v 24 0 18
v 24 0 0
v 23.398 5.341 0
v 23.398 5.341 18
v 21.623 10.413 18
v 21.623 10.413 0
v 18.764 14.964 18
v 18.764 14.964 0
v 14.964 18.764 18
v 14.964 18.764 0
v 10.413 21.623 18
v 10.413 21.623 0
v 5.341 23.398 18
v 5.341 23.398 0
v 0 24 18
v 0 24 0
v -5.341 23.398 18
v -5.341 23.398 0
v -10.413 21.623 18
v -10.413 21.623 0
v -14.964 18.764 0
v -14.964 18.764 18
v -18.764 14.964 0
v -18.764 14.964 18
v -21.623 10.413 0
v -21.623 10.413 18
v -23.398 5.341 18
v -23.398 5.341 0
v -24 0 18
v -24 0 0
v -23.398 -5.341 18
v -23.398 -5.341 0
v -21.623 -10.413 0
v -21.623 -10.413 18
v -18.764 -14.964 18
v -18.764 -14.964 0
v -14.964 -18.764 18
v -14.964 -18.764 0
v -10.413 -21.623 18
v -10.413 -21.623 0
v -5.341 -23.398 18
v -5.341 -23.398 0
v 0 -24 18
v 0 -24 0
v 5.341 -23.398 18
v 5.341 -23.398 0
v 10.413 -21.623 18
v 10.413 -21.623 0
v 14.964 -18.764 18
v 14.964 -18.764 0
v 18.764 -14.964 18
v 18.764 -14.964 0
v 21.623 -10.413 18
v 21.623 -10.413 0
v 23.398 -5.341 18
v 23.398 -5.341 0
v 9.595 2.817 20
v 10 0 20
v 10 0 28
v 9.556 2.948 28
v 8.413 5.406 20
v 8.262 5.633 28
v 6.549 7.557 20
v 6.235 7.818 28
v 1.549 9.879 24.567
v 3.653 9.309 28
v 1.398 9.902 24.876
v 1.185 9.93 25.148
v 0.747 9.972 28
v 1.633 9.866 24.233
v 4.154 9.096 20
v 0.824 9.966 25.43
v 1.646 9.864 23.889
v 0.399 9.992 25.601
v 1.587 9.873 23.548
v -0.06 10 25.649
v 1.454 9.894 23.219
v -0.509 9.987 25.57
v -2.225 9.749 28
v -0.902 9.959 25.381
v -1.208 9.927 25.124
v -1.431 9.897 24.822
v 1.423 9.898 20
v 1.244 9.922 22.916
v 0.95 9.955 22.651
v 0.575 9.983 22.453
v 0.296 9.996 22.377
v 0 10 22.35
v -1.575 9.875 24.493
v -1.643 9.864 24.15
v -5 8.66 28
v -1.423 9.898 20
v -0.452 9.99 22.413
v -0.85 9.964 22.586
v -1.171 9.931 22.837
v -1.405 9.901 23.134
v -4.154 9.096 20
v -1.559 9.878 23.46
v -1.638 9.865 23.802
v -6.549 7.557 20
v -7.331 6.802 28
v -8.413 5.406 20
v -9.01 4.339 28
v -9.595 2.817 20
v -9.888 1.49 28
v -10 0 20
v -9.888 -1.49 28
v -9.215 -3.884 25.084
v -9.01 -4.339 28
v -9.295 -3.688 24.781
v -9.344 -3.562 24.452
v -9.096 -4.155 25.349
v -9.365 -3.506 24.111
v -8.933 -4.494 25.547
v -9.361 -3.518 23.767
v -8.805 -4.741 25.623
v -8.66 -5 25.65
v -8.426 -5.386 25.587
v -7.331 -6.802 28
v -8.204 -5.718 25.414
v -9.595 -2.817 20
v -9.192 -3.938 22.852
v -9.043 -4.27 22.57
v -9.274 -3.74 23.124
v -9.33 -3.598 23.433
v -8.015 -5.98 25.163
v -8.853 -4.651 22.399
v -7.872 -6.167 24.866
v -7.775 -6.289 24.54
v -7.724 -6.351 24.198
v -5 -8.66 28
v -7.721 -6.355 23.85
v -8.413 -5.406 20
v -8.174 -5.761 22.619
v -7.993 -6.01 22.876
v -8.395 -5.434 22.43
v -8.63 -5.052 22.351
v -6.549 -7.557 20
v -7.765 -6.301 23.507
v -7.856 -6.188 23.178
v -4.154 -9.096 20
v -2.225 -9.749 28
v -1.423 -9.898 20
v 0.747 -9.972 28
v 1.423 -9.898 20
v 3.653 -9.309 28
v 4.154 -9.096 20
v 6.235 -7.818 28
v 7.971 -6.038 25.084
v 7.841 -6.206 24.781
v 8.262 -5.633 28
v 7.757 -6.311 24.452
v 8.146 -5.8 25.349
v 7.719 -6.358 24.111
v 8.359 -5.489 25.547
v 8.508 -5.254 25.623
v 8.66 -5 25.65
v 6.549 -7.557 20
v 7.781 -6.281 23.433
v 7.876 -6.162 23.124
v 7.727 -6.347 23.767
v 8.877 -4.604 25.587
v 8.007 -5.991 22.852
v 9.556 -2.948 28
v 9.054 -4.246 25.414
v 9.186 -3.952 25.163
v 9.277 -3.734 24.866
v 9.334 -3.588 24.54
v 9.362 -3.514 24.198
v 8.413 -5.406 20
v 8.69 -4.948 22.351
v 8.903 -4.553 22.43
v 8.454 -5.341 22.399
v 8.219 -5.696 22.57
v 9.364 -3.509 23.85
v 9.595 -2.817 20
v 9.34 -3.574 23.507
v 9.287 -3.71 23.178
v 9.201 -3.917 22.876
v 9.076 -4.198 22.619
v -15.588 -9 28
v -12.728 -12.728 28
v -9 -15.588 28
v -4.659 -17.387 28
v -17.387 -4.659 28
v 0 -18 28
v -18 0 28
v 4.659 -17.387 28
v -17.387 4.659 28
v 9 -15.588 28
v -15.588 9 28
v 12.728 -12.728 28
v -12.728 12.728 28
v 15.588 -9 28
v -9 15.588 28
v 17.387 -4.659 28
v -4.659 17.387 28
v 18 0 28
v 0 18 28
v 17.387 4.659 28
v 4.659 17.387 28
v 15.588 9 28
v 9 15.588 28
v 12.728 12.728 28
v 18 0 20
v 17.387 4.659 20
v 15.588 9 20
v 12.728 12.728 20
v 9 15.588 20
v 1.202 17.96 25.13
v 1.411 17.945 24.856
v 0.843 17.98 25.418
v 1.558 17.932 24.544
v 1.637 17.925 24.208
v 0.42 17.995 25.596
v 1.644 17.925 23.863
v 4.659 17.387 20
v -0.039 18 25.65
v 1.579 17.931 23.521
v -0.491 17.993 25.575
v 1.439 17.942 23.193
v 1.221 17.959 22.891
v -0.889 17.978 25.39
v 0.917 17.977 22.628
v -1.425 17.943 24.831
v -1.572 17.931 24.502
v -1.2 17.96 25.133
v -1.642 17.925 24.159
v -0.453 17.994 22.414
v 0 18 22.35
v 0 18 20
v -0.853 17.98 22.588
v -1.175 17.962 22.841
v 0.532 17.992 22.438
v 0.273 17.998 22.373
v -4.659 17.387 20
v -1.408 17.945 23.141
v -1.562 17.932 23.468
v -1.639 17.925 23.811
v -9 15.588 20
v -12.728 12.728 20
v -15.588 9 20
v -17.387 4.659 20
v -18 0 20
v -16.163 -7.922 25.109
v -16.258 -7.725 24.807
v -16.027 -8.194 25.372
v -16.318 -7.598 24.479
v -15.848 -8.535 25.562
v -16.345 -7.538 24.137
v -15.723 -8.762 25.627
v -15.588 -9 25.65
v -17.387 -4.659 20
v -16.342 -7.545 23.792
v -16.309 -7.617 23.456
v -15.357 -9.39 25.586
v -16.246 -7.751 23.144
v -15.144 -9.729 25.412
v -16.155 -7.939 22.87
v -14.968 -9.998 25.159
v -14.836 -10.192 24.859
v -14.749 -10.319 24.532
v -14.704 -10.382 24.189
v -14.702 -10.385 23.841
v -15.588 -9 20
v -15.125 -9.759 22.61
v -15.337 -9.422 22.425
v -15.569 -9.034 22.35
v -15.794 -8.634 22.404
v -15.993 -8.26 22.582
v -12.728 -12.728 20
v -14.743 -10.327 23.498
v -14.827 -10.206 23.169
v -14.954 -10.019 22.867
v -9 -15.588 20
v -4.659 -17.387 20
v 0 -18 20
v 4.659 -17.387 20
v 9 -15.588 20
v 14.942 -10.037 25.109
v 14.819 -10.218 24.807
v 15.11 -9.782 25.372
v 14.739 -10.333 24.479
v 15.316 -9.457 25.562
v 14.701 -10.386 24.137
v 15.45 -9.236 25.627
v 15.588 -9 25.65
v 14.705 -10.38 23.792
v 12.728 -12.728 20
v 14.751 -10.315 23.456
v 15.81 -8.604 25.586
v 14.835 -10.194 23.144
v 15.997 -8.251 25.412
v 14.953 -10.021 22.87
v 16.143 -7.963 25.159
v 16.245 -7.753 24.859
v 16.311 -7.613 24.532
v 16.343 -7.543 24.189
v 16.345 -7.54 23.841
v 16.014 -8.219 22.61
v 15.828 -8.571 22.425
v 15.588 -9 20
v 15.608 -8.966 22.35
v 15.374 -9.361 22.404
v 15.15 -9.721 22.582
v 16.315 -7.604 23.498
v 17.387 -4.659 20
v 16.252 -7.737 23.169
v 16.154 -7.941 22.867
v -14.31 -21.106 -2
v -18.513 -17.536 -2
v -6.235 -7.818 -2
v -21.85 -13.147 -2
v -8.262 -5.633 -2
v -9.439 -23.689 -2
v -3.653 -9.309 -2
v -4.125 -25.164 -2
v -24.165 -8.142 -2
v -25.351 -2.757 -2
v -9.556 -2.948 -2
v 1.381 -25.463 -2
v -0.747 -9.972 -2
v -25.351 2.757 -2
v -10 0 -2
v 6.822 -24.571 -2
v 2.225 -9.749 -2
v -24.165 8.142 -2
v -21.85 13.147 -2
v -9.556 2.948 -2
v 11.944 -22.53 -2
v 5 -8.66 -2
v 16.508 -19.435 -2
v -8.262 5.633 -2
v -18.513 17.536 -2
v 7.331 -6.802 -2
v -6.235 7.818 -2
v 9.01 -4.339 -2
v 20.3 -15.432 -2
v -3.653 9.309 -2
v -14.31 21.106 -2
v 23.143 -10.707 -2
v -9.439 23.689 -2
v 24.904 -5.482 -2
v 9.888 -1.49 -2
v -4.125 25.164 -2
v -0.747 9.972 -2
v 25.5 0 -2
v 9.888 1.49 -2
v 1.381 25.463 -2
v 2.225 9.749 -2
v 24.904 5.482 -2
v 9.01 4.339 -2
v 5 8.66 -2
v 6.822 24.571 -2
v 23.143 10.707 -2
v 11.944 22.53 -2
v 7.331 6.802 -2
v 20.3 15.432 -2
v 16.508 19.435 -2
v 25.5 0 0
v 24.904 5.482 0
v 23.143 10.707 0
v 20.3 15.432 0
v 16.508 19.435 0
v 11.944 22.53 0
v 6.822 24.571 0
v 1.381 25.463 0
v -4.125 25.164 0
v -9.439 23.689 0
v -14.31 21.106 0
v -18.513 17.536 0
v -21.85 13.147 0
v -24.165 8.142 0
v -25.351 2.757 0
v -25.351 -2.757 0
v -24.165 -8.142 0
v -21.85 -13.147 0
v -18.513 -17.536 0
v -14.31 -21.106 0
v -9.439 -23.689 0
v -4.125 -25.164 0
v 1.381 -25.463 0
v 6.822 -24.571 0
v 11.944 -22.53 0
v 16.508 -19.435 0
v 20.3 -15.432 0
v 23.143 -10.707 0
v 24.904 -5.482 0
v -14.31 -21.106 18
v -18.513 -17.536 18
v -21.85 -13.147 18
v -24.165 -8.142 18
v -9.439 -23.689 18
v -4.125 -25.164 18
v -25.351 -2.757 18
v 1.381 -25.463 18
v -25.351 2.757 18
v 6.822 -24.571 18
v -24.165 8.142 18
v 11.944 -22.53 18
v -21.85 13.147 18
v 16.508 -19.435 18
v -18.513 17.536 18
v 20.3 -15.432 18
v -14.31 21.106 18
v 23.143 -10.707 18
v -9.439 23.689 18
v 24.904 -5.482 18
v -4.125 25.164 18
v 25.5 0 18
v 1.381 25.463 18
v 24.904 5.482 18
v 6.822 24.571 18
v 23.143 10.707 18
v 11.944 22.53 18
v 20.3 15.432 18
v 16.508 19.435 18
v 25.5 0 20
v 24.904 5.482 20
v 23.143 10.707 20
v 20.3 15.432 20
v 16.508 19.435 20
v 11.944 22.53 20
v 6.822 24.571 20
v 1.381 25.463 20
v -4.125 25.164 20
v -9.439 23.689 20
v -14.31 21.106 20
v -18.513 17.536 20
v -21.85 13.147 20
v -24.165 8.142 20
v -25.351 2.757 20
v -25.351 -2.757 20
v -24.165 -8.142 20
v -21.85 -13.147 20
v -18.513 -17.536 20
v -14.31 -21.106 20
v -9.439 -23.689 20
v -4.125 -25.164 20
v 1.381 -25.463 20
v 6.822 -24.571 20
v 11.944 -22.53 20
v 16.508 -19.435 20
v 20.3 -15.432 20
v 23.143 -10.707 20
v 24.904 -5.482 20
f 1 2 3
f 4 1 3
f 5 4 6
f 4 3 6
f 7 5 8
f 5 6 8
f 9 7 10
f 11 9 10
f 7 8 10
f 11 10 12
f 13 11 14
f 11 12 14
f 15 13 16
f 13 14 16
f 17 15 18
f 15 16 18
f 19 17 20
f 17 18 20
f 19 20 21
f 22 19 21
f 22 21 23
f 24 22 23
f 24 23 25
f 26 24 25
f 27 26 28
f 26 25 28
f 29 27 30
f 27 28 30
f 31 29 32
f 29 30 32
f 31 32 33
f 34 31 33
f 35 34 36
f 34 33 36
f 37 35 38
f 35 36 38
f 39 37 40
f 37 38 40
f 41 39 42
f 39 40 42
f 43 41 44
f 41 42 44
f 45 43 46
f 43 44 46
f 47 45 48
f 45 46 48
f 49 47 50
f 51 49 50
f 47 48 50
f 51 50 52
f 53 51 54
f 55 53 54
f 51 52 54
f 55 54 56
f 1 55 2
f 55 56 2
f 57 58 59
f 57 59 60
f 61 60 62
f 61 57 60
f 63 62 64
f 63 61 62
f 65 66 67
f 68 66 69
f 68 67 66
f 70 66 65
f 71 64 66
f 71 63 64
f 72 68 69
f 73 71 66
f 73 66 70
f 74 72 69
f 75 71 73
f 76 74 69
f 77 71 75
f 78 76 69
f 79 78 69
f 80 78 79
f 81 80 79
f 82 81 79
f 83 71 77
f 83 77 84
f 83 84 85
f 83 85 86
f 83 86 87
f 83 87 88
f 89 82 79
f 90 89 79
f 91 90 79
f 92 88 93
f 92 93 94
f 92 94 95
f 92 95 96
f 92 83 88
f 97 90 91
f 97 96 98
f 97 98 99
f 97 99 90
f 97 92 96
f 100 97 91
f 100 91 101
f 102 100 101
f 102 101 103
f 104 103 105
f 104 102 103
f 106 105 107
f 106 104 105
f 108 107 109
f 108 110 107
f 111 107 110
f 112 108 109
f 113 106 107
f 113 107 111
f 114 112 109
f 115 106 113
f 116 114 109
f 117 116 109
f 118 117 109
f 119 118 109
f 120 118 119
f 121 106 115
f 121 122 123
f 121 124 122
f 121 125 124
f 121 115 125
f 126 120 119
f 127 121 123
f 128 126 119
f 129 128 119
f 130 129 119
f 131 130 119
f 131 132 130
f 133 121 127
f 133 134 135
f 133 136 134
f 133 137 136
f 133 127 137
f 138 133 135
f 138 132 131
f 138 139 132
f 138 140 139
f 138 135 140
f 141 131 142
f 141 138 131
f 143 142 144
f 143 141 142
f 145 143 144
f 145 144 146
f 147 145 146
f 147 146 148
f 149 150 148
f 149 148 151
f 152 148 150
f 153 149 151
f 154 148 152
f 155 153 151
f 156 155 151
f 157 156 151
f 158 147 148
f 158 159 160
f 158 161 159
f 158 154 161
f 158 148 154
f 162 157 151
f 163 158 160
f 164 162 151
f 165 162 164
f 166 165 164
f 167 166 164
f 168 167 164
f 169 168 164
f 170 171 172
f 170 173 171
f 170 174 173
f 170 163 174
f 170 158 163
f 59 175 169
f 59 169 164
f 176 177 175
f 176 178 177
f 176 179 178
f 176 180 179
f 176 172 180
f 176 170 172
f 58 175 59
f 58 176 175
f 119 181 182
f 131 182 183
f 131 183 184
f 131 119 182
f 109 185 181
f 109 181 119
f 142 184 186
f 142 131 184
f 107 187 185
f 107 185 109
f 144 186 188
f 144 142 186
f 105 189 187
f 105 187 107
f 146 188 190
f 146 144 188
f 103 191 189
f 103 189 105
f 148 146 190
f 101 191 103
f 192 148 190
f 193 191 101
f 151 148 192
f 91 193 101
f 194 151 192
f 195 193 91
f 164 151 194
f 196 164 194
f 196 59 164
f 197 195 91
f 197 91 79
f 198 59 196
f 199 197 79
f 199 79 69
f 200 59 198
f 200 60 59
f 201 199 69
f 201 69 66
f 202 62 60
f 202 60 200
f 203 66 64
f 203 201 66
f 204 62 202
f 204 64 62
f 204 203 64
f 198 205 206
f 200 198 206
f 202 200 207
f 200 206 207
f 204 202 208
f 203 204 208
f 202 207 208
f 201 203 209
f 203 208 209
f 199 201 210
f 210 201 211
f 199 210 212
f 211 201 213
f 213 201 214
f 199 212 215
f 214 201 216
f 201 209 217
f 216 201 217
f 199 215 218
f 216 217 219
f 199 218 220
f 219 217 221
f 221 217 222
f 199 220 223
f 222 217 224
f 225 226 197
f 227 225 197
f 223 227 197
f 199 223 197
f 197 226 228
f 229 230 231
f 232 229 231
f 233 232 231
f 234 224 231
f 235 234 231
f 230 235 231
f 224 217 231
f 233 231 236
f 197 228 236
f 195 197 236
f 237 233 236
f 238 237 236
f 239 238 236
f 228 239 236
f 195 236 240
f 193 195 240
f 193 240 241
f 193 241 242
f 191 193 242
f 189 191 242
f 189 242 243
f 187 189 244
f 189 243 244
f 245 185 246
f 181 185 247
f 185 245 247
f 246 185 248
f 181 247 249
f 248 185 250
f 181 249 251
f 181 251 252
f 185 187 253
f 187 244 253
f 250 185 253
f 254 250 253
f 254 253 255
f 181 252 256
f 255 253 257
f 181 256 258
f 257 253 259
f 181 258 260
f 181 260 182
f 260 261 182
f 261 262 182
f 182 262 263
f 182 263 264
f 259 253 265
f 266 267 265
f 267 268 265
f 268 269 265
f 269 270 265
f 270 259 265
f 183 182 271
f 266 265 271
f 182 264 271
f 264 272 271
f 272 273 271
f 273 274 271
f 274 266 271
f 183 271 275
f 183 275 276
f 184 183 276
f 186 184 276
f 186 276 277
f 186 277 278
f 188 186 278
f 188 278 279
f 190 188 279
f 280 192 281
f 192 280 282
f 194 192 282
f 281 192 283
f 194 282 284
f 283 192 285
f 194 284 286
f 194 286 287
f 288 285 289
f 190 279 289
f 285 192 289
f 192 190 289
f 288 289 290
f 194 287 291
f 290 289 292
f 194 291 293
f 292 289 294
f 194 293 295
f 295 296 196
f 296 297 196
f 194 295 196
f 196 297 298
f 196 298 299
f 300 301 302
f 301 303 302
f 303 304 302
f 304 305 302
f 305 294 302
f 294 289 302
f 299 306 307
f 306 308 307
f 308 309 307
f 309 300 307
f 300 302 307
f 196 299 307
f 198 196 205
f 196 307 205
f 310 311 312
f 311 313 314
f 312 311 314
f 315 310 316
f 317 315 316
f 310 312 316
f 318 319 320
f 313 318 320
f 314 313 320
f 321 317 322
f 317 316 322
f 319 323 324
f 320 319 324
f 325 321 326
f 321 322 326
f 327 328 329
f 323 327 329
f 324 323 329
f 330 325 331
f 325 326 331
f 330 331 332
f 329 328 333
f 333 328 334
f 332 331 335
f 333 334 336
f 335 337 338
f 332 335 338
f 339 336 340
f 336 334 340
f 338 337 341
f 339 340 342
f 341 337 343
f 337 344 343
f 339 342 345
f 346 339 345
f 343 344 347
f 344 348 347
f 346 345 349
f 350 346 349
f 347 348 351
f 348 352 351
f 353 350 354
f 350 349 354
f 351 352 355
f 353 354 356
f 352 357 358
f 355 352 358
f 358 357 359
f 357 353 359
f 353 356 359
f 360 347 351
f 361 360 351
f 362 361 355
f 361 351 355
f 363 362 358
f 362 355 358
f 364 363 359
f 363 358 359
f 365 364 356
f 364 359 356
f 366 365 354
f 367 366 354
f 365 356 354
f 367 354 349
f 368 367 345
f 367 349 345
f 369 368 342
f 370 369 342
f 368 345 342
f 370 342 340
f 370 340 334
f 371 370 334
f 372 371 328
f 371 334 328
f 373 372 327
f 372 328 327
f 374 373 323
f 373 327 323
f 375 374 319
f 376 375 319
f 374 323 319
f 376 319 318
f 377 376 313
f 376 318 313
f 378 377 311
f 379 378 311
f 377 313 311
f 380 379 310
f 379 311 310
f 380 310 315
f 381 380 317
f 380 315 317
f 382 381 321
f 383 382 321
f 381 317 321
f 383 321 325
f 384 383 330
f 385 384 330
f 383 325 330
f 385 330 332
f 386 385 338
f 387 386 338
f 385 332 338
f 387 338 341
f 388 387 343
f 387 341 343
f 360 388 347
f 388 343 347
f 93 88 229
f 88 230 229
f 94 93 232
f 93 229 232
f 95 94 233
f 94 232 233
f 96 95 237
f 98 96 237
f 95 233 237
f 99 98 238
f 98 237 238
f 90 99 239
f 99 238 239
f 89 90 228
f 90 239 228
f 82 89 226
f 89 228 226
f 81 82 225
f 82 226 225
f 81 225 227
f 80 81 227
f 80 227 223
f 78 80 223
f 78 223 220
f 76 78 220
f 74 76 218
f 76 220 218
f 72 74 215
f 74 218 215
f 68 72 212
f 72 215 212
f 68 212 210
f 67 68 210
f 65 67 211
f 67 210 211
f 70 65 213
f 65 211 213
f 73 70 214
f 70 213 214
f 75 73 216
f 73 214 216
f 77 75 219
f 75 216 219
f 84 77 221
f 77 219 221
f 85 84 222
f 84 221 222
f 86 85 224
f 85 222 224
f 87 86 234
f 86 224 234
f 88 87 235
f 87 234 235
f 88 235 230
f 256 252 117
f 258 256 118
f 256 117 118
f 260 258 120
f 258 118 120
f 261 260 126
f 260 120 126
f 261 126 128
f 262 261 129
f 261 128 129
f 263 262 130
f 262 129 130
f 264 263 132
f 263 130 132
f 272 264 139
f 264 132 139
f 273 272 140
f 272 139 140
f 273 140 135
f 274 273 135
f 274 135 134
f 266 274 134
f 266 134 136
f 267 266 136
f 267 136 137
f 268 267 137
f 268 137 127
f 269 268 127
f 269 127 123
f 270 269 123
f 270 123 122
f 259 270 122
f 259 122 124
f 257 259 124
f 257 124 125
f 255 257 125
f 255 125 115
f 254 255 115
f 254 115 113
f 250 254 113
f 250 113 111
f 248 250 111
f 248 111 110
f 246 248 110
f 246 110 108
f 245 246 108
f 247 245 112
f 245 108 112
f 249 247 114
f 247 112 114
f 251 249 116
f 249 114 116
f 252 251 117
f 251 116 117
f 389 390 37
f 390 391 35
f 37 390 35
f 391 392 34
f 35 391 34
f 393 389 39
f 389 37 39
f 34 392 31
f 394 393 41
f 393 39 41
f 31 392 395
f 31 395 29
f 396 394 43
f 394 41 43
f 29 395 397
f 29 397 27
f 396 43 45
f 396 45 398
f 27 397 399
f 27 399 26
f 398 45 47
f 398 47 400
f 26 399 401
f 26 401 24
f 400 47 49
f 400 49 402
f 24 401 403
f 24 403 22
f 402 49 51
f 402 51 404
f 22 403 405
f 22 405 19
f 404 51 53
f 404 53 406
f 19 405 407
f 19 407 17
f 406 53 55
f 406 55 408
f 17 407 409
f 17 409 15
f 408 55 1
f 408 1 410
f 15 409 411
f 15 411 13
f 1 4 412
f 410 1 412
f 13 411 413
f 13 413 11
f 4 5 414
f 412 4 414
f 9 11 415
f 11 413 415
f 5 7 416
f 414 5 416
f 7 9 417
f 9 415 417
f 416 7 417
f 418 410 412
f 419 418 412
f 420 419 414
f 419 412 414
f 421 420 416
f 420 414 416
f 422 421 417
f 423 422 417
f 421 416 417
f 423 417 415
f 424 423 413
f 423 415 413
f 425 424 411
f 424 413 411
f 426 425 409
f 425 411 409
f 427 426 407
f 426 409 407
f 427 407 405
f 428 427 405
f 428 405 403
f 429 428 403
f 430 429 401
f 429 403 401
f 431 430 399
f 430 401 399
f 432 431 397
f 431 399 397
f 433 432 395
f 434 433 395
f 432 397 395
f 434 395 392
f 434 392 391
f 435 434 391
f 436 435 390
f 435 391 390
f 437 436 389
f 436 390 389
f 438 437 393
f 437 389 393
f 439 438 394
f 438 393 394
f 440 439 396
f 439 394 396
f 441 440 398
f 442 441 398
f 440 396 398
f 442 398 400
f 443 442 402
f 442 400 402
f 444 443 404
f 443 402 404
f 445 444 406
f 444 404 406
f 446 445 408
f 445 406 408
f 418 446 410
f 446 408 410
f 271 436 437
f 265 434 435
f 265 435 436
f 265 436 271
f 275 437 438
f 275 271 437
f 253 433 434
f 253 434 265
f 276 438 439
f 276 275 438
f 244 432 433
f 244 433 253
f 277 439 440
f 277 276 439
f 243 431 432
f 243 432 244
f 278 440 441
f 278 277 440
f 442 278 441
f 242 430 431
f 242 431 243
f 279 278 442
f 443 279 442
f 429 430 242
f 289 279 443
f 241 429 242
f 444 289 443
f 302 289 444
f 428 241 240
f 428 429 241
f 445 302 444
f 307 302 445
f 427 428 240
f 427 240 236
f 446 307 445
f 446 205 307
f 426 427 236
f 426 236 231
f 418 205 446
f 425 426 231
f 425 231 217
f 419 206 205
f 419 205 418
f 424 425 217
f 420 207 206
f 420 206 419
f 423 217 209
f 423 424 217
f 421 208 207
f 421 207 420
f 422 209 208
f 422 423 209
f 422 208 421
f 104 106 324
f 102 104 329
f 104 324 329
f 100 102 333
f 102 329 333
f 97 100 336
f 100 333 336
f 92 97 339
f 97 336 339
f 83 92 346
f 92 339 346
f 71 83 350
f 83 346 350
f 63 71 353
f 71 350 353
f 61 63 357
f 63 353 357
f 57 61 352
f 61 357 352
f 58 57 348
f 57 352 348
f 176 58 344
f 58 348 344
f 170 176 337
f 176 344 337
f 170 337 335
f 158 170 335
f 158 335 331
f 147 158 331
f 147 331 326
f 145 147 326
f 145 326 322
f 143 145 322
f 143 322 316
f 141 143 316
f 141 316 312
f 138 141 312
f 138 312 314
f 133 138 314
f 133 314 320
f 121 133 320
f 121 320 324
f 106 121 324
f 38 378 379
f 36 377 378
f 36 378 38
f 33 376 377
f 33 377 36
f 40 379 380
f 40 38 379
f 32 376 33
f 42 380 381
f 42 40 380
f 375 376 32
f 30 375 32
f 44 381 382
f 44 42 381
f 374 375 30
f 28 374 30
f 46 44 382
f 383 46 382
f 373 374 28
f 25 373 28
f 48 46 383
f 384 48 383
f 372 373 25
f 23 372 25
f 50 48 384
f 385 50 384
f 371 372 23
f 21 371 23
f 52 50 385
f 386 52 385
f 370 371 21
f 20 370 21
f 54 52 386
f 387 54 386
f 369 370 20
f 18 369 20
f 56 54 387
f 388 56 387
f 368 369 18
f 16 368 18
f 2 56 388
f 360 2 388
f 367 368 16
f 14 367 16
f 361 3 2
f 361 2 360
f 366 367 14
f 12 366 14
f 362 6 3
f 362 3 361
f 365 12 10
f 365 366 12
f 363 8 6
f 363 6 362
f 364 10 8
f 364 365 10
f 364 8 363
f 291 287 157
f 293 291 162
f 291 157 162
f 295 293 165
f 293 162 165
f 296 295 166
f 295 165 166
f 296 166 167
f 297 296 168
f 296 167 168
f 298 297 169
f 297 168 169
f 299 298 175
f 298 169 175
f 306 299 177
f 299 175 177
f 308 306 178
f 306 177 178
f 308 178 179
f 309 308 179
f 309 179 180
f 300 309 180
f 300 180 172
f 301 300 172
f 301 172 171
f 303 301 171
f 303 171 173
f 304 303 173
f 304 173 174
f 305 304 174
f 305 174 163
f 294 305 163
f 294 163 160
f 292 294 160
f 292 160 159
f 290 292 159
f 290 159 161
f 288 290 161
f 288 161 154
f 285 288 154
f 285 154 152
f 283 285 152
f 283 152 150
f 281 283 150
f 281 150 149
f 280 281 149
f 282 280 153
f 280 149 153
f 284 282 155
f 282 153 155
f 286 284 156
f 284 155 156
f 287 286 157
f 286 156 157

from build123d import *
from build123d.topology import SkipClean

# Parameters (mm, degrees)
SKETCH1_R                   = 24
BOSS_EXTRUDE1_DEPTH         = 18
SKETCH2_R                   = 25.5
BOSS_EXTRUDE2_DEPTH         = 2
BOSS_EXTRUDE3_START         = -20
SKETCH2_2_R                 = 25.5
BOSS_EXTRUDE3_DEPTH         = 2
F_20_0MM_DOWEL_HOLE1_D      = 20
SKETCH13_R                  = 18
SKETCH13_R_2                = 10
BOSS_EXTRUDE4_DEPTH         = 8
SKETCH16_W                  = 1.65
SKETCH16_H                  = 25.5
TAP_DRILL_FOR_M4_TAP3_D     = 3.3
TAP_DRILL_FOR_M4_TAP3_DEPTH = 16.83
TAP_DRILL_FOR_M4_TAP3_TIP   = 0.991420021
TAP_DRILL_FOR_M4_TAP4_D     = 3.3
TAP_DRILL_FOR_M4_TAP4_DEPTH = 16.83
TAP_DRILL_FOR_M4_TAP4_TIP   = 0.991420021


with BuildPart() as part:
    # Sketch1 → Boss-Extrude1 (new body)
    with BuildSketch(Plane.XY):
        Circle(SKETCH1_R)
    extrude(amount=BOSS_EXTRUDE1_DEPTH)

    # Sketch2 → Boss-Extrude2 (add)
    with BuildSketch(Plane.XY.offset(18)):
        Circle(SKETCH2_R)
    extrude(amount=BOSS_EXTRUDE2_DEPTH)

    # Sketch2<2> → Boss-Extrude3 (add)
    with BuildSketch(Plane.XY.offset(18).offset(BOSS_EXTRUDE3_START)):
        Circle(SKETCH2_2_R)
    extrude(amount=BOSS_EXTRUDE3_DEPTH)

    # Ø20.0mm Dowel Hole1 (through all)
    with Locations(Plane.XY.offset(20)):
        with Locations((0, 0)):
            Hole(F_20_0MM_DOWEL_HOLE1_D / 2)

    # Sketch13 → Boss-Extrude4 (add)
    with SkipClean():  # the faces are left unmerged after this step: merging them gives an invalid solid
        with BuildSketch(Plane.XY.offset(20)):
            Circle(SKETCH13_R)
            Circle(SKETCH13_R_2, mode=Mode.SUBTRACT)
        extrude(amount=BOSS_EXTRUDE4_DEPTH)
    add(part.part.scale(1), mode=Mode.REPLACE)  # the faces are merged on a copy

    # Sketch16 → Tap Drill for M4 Tap1 (revolve, cut)
    with BuildSketch(Plane(origin=(0, 0, 24), x_dir=(0, 0, -1), z_dir=(1, 0, 0))):
        with Locations((0.825, 12.75)):
            Rectangle(SKETCH16_W, SKETCH16_H)
    revolve(axis=Axis((0, -6.35, 24), (0, 1, 0)), mode=Mode.SUBTRACT)

    # Tap Drill for M4 Tap3
    with Locations(Plane(origin=(-15.588457268, -9, 0), x_dir=(0, 0, -1), z_dir=(-0.8660254037844433, -0.49999999999999195, 0))):
        with Locations((-24, 0)):
            Hole(TAP_DRILL_FOR_M4_TAP3_D / 2, depth=TAP_DRILL_FOR_M4_TAP3_DEPTH)
            with Locations((0, 0, -(TAP_DRILL_FOR_M4_TAP3_DEPTH + TAP_DRILL_FOR_M4_TAP3_TIP / 2))):  # 118° drill point
                Cone(0, TAP_DRILL_FOR_M4_TAP3_D / 2, TAP_DRILL_FOR_M4_TAP3_TIP, mode=Mode.SUBTRACT)

    # Tap Drill for M4 Tap4
    with Locations(Plane(origin=(15.588457268, -9, 0), x_dir=(0, 0, -1), z_dir=(0.8660254037844364, -0.5000000000000041, 0))):
        with Locations((-24, 0)):
            Hole(TAP_DRILL_FOR_M4_TAP4_D / 2, depth=TAP_DRILL_FOR_M4_TAP4_DEPTH)
            with Locations((0, 0, -(TAP_DRILL_FOR_M4_TAP4_DEPTH + TAP_DRILL_FOR_M4_TAP4_TIP / 2))):  # 118° drill point
                Cone(0, TAP_DRILL_FOR_M4_TAP4_D / 2, TAP_DRILL_FOR_M4_TAP4_TIP, mode=Mode.SUBTRACT)


solid = part.part
